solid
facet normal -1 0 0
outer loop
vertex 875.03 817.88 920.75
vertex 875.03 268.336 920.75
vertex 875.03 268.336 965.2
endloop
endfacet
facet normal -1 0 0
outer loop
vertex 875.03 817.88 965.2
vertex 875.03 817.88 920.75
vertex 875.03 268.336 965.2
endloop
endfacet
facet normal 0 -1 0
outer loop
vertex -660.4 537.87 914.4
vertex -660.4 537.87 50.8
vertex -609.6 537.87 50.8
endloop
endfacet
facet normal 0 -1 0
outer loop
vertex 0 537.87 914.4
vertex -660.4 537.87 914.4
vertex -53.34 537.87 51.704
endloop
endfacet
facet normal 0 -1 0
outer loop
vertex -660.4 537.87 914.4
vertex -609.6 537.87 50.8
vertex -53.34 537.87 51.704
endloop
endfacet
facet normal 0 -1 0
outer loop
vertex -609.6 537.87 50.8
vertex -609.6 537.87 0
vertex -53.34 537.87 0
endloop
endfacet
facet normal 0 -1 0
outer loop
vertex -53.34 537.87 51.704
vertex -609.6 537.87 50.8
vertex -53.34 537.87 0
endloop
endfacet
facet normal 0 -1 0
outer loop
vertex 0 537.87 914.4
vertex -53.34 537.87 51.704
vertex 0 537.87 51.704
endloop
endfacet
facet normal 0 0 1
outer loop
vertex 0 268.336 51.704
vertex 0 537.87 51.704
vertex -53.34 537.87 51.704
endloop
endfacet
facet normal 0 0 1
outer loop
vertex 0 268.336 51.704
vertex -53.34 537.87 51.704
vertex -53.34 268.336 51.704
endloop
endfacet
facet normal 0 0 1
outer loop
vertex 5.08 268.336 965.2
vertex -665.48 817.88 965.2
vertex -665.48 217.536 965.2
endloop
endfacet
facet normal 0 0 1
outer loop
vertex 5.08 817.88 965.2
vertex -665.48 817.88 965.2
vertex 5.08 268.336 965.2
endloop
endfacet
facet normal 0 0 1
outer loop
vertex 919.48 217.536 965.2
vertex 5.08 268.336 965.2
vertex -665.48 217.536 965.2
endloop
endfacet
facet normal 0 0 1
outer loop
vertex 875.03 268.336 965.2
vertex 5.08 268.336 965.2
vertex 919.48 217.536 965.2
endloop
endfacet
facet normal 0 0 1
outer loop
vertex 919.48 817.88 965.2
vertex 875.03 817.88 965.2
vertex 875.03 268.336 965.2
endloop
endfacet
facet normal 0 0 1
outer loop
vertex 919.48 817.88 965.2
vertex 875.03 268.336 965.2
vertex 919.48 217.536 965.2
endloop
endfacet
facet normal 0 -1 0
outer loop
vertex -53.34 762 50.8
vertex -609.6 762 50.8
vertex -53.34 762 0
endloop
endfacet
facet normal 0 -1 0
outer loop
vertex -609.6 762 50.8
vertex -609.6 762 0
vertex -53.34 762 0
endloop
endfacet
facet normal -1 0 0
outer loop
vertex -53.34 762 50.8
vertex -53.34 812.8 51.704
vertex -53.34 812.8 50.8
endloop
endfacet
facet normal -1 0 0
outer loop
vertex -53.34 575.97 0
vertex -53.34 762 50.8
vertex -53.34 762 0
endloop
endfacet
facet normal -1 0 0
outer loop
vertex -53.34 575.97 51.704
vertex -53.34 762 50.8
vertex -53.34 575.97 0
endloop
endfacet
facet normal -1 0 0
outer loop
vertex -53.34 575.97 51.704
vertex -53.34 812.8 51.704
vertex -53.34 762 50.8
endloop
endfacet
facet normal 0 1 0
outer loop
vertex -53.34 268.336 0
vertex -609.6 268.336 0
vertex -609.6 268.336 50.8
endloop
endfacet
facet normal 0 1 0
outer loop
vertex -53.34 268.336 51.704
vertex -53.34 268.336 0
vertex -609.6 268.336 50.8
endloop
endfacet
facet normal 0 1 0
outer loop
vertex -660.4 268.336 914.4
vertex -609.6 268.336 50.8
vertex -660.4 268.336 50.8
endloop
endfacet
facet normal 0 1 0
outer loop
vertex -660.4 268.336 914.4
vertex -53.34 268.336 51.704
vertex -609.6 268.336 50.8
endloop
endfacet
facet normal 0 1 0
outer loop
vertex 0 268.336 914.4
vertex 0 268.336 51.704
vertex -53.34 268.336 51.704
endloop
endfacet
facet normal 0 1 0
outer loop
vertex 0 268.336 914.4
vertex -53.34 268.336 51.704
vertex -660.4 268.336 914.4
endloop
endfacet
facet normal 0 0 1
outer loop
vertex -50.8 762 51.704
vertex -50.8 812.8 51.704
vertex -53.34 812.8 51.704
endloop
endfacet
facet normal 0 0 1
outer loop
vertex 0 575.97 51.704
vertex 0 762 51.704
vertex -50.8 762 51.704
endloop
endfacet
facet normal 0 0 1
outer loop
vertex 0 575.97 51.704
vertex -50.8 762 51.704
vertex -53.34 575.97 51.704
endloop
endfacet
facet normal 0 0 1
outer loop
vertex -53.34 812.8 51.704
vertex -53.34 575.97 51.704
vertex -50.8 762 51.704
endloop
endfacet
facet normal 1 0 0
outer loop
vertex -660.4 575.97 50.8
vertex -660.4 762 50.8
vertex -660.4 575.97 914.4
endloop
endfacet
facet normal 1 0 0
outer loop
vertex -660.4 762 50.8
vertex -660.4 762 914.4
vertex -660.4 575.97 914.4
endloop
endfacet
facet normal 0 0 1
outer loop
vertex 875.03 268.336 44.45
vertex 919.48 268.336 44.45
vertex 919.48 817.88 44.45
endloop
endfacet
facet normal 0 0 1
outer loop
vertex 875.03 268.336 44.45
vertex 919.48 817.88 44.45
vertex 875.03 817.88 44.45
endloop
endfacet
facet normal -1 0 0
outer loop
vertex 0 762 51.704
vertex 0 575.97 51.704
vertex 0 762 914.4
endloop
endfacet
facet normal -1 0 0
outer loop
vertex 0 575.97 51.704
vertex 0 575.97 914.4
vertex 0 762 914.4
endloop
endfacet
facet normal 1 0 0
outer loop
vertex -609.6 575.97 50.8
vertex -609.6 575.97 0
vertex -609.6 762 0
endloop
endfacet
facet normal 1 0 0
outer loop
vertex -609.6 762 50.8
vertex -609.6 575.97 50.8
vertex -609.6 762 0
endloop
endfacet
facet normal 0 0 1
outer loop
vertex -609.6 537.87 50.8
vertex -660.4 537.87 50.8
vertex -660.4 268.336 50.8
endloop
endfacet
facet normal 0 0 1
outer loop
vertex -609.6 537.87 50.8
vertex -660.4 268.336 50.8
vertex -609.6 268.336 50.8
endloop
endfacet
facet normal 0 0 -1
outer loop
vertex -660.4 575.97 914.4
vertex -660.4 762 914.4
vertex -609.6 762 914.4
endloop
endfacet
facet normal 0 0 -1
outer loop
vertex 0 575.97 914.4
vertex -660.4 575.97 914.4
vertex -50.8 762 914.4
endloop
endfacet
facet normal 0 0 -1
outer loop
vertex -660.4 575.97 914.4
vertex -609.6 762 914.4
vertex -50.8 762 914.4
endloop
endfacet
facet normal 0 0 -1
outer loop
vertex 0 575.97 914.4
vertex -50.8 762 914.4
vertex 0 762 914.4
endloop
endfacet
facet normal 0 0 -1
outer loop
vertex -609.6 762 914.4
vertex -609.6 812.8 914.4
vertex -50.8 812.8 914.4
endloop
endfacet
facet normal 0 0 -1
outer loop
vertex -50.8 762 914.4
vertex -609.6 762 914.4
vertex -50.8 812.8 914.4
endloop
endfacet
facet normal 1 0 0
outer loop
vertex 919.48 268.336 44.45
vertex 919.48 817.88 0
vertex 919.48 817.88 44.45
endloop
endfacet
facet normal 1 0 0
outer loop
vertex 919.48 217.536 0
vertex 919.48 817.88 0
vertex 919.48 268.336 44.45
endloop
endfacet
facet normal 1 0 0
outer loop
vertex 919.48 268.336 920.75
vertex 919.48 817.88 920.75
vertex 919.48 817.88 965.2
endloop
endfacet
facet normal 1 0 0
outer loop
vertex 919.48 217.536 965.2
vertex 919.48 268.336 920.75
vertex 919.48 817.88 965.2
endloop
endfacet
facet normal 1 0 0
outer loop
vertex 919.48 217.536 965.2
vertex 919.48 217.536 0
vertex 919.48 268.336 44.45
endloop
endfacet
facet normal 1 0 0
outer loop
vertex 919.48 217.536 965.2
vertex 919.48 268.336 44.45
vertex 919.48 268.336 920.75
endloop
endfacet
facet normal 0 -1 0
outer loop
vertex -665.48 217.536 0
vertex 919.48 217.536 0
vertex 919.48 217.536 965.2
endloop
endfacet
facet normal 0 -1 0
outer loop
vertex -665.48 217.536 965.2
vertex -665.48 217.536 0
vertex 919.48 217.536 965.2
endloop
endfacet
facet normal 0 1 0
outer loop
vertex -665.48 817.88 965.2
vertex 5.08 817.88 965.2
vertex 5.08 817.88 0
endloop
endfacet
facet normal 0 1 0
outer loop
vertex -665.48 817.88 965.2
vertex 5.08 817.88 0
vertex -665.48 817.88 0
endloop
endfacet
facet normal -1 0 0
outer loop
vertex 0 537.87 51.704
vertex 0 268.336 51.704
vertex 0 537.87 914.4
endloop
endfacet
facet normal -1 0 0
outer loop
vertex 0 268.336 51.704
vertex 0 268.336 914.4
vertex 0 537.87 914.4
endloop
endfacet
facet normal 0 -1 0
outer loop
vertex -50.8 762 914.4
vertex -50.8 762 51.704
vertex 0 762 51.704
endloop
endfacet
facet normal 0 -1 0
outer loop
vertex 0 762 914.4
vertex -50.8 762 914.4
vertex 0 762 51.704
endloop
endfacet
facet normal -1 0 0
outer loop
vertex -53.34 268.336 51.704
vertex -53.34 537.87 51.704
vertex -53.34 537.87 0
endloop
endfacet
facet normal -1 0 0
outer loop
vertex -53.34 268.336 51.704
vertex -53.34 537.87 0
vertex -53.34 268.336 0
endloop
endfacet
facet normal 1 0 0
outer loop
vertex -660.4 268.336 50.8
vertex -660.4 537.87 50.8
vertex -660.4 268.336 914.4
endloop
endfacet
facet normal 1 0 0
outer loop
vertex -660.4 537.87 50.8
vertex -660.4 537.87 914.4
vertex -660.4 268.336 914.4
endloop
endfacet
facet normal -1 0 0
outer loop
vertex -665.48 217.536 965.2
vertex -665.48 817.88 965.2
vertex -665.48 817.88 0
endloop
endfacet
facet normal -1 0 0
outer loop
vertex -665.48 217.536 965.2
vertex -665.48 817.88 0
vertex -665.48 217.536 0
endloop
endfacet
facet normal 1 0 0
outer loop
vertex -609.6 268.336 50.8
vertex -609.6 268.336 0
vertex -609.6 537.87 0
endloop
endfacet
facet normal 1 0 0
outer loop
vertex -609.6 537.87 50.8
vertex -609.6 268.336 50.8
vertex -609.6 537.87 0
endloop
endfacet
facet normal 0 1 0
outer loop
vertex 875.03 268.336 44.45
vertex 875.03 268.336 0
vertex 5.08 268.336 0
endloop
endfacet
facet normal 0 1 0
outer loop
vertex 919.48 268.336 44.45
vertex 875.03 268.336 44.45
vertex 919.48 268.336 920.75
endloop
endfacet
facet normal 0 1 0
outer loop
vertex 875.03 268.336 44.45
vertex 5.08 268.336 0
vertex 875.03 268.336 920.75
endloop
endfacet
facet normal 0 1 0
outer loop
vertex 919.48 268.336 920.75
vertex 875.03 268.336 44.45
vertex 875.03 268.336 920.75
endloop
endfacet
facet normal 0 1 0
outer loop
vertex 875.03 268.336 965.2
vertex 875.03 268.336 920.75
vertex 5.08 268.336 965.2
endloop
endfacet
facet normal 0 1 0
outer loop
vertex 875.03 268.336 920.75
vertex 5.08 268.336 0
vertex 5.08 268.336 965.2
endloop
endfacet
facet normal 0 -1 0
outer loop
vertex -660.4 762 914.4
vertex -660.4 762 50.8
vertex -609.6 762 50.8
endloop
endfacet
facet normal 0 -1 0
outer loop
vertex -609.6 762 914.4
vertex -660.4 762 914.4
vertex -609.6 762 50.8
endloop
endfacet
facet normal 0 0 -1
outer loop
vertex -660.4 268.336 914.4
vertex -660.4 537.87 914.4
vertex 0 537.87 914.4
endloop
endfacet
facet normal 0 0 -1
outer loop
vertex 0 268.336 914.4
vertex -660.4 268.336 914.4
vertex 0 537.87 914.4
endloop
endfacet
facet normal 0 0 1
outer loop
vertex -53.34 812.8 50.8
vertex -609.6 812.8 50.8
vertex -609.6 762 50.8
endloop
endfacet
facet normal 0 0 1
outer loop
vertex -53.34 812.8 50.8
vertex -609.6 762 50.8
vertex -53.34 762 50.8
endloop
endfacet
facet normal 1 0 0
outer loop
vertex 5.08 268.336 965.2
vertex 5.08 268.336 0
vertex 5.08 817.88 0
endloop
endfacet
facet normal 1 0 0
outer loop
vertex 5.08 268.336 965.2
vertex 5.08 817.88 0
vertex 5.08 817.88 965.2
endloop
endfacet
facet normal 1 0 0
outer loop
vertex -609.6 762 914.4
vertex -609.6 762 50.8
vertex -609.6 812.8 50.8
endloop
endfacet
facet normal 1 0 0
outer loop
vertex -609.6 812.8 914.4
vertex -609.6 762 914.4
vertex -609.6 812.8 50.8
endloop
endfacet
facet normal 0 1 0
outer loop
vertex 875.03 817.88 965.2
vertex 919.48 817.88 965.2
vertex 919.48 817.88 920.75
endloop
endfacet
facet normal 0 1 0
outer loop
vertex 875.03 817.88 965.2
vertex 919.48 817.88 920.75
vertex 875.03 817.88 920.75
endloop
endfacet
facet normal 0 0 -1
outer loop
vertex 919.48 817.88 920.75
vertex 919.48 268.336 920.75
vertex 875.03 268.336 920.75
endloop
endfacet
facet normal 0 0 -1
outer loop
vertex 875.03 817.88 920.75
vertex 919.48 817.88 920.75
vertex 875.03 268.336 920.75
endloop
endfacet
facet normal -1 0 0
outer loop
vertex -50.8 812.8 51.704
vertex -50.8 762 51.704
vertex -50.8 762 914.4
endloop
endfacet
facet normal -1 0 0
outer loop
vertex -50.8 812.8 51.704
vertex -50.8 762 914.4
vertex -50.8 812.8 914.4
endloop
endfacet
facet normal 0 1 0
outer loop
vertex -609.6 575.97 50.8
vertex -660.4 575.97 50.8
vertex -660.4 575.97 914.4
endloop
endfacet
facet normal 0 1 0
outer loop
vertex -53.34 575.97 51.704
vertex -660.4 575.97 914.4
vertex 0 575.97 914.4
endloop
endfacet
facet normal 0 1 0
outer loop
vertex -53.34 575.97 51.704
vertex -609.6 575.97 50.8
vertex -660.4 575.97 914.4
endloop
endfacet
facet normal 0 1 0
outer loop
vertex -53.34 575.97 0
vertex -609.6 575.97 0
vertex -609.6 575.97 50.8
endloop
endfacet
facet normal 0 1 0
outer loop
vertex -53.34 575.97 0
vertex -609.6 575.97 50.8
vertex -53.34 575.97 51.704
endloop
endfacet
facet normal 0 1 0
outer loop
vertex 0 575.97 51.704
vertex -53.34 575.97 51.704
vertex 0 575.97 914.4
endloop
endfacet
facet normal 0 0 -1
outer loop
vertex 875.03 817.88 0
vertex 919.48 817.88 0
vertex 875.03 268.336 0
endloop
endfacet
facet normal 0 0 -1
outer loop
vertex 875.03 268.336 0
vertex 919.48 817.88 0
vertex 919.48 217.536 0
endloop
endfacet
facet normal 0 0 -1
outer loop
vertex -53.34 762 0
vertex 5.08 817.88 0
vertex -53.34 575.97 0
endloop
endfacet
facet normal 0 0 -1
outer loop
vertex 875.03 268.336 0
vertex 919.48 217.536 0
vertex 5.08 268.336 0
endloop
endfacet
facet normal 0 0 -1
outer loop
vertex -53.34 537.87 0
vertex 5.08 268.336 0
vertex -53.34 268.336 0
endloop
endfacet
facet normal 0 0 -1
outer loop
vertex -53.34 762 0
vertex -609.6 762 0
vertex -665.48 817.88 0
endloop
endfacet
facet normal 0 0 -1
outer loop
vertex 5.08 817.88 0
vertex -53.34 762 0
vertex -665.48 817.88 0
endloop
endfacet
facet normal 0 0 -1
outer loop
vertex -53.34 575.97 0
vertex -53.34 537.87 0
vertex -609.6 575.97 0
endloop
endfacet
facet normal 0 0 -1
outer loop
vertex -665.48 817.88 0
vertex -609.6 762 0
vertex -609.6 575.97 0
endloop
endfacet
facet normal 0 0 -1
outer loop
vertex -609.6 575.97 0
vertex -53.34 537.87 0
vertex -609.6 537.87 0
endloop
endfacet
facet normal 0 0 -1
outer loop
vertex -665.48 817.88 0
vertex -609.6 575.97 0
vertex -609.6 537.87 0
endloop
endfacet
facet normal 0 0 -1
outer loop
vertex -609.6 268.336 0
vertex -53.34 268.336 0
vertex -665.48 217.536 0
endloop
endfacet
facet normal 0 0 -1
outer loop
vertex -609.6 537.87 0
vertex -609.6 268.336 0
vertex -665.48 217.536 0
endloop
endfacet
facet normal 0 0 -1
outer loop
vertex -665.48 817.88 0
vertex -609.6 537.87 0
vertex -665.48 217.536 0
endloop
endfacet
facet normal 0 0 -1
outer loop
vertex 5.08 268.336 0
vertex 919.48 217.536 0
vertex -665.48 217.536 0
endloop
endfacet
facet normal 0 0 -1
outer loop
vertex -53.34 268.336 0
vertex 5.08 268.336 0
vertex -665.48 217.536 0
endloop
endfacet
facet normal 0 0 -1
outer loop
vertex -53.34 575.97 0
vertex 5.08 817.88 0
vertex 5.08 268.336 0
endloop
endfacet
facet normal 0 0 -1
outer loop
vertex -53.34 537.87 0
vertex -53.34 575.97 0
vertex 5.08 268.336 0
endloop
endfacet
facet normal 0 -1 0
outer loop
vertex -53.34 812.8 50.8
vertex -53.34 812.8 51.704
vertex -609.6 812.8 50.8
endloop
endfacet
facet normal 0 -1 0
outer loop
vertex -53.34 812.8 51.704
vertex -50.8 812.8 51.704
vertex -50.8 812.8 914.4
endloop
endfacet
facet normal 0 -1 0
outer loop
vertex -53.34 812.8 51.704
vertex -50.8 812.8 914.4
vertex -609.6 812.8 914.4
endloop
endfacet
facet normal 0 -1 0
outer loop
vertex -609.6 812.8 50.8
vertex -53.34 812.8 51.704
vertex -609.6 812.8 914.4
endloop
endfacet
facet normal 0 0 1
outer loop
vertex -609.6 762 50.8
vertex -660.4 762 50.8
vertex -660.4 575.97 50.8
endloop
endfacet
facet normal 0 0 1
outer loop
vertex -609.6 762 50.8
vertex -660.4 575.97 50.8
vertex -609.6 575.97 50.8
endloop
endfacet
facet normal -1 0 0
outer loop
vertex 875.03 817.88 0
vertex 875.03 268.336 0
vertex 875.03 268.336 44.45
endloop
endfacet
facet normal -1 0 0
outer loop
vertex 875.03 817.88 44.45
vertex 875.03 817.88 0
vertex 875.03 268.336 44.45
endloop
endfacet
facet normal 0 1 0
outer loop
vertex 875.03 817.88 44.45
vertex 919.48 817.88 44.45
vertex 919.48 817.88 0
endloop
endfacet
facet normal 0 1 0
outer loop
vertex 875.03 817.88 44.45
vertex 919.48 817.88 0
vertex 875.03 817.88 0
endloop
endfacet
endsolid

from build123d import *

# Parameters (mm, degrees)
F0_W           = 1320.8
F0_H           = 1625.6
F0_W_2         = 1219.2
F0_H_2         = 1524
F1_DEPTH       = 50.8
F2_W           = 50.8
F2_H           = 50.8
F3_DEPTH       = 863.6
F4_W           = 1320.8
F4_H           = 1625.6
F4_W_2         = 1219.2
F4_H_2         = 1524
F5_DEPTH       = 50.8
F6_W           = 609.6
F6_H           = 50.8
F7_DEPTH       = 1524
F9_DEPTH       = 965.201
F10_W          = 50.8
F10_H          = 50.8
F11_DEPTH      = 863.6
F12_W          = 558.8
F12_H          = 254
F13_DEPTH      = 914.4
F14_W          = 914.4
F14_H          = 254
F15_DEPTH      = 1625.601
F16_W          = 1625.6
F16_H          = 965.2
F17_DEPTH      = 5.08
F18_W          = 1625.6
F18_H          = 965.2
F19_DEPTH      = 5.08
F20_W          = 1627.432287
F20_H          = 51.704206
F21_DEPTH      = 53.34
F22_W          = 50.8
F22_H          = 965.2
F23_DEPTH      = 914.4
F23_DEPTH_BACK = 665.48
F24_W          = 670.56
F24_H          = 965.2
F25_DEPTH      = 5.08
F26_W          = 670.56
F26_H          = 965.2
F27_DEPTH      = 5.08
F28_W          = 44.45
F28_H          = 44.45
F29_DEPTH      = 549.543908
F30_W          = 670.56
F30_H          = 1035.416092
F31_DEPTH      = 965.201
F32_W          = 670.56
F32_H          = 38.1
F33_DEPTH      = 914.4


with BuildPart() as f1:
    # F0 (on Top) → F1 (new body)
    with BuildSketch(Plane.XY):
        Rectangle(F0_W, F0_H)
        Rectangle(F0_W_2, F0_H_2, mode=Mode.SUBTRACT)
    extrude(amount=F1_DEPTH)

    # F2 (on face) → F3 (join)
    with BuildSketch(Plane.XY.offset(50.8)):
        with Locations((-635, 787.4)):
            Rectangle(F2_W, F2_H)
        with Locations((635, 787.4)):
            Rectangle(F2_W, F2_H)
        with Locations((635, -787.4)):
            Rectangle(F2_W, F2_H)
        with Locations((-635, -787.4)):
            Rectangle(F2_W, F2_H)
    extrude(amount=F3_DEPTH)

    # F4 (on face) → F5 (join)
    with BuildSketch(Plane.XY.offset(914.4)):
        Rectangle(F4_W, F4_H)
        Rectangle(F4_W_2, F4_H_2, mode=Mode.SUBTRACT)
    extrude(amount=F5_DEPTH)

    # F6 (on face) → F7 (join, through all)
    with BuildSketch(Plane.XZ.offset(-762)):
        with Locations((-304.8, 939.8)):
            Rectangle(F6_W, F6_H)
    extrude(amount=F7_DEPTH)

    # F8 (on face) → F9 (cut, through all)
    with BuildSketch(Plane.XY.offset(965.2)):
        Polygon((0, 812.8), (0, 762), (0, -812.8), (660.4, -812.8), (660.4, 812.8), align=None)
    extrude(amount=-F9_DEPTH, mode=Mode.SUBTRACT)

    # F10 (on face) → F11 (join, through all)
    with BuildSketch(Plane.XY.offset(50.8)):
        with Locations((-25.4, 787.4)):
            Rectangle(F10_W, F10_H)
        with Locations((-25.4, -787.4)):
            Rectangle(F10_W, F10_H)
    extrude(amount=F11_DEPTH)

    # F12 (on face) → F13 (join)
    with BuildSketch(Plane.YZ):
        with Locations((533.4, 127)):
            Rectangle(F12_W, F12_H)
    extrude(amount=F13_DEPTH)

    # F14 (on face) → F15 (cut, through all)
    with BuildSketch(Plane(origin=(0, 812.8, 0), x_dir=(-1, 0, 0), z_dir=(0, 1, 0))):
        with Locations((-457.2, 127)):
            Rectangle(F14_W, F14_H)
    extrude(amount=-F15_DEPTH, mode=Mode.SUBTRACT)

    # F16 (on face) → F17 (join)
    with BuildSketch(Plane.YZ):
        with Locations((0, 482.6)):
            Rectangle(F16_W, F16_H)
    extrude(amount=F17_DEPTH)

    # F18 (on face) → F19 (join)
    with BuildSketch(Plane(origin=(-660.4, 0, 0), x_dir=(0, -1, 0), z_dir=(-1, 0, 0))):
        with Locations((0, 482.6)):
            Rectangle(F18_W, F18_H)
    extrude(amount=F19_DEPTH)

    # F20 (on face) → F21 (join)
    with BuildSketch(Plane(origin=(0, 0, 0), x_dir=(0, -1, 0), z_dir=(-1, 0, 0))):
        with Locations((-1.976996, 25.852103)):
            Rectangle(F20_W, F20_H)
    extrude(amount=F21_DEPTH)

    # F22 (on face) → F23 (join, two sides)
    with BuildSketch(Plane.YZ.offset(5.08)) as f23_sk:
        with Locations((242.936092, 482.6)):
            Rectangle(F22_W, F22_H)
    extrude(amount=F23_DEPTH)
    extrude(f23_sk.sketch, amount=-F23_DEPTH_BACK)

    # F24 (on face) → F25 (join)
    with BuildSketch(Plane(origin=(0, 812.8, 0), x_dir=(-1, 0, 0), z_dir=(0, 1, 0))):
        with Locations((330.2, 482.6)):
            Rectangle(F24_W, F24_H)
    extrude(amount=F25_DEPTH)

    # F26 (on face) → F27 (join)
    with BuildSketch(Plane.XZ.offset(812.8)):
        with Locations((-330.2, 482.6)):
            Rectangle(F26_W, F26_H)
    extrude(amount=F27_DEPTH)

    # F28 (on face) → F29 (join, through all)
    with BuildSketch(Plane(origin=(0, 268.336092, 0), x_dir=(-1, 0, 0), z_dir=(0, 1, 0))):
        with Locations((-897.255, 22.225)):
            Rectangle(F28_W, F28_H)
        with Locations((-897.255, 942.975)):
            Rectangle(F28_W, F28_H)
    extrude(amount=F29_DEPTH)

    # F30 (on face) → F31 (cut, through all)
    with BuildSketch(Plane(origin=(0, 0, 0), x_dir=(1, 0, 0), z_dir=(0, 0, -1))):
        with Locations((-330.2, 300.171954)):
            Rectangle(F30_W, F30_H)
    extrude(amount=-F31_DEPTH, mode=Mode.SUBTRACT)

    # F32 (on face) → F33 (join, through all)
    with BuildSketch(Plane(origin=(0, 0, 0), x_dir=(1, 0, 0), z_dir=(0, 0, -1))):
        with Locations((-330.2, -556.9204)):
            Rectangle(F32_W, F32_H)
    extrude(amount=-F33_DEPTH)


solid = f1.part
